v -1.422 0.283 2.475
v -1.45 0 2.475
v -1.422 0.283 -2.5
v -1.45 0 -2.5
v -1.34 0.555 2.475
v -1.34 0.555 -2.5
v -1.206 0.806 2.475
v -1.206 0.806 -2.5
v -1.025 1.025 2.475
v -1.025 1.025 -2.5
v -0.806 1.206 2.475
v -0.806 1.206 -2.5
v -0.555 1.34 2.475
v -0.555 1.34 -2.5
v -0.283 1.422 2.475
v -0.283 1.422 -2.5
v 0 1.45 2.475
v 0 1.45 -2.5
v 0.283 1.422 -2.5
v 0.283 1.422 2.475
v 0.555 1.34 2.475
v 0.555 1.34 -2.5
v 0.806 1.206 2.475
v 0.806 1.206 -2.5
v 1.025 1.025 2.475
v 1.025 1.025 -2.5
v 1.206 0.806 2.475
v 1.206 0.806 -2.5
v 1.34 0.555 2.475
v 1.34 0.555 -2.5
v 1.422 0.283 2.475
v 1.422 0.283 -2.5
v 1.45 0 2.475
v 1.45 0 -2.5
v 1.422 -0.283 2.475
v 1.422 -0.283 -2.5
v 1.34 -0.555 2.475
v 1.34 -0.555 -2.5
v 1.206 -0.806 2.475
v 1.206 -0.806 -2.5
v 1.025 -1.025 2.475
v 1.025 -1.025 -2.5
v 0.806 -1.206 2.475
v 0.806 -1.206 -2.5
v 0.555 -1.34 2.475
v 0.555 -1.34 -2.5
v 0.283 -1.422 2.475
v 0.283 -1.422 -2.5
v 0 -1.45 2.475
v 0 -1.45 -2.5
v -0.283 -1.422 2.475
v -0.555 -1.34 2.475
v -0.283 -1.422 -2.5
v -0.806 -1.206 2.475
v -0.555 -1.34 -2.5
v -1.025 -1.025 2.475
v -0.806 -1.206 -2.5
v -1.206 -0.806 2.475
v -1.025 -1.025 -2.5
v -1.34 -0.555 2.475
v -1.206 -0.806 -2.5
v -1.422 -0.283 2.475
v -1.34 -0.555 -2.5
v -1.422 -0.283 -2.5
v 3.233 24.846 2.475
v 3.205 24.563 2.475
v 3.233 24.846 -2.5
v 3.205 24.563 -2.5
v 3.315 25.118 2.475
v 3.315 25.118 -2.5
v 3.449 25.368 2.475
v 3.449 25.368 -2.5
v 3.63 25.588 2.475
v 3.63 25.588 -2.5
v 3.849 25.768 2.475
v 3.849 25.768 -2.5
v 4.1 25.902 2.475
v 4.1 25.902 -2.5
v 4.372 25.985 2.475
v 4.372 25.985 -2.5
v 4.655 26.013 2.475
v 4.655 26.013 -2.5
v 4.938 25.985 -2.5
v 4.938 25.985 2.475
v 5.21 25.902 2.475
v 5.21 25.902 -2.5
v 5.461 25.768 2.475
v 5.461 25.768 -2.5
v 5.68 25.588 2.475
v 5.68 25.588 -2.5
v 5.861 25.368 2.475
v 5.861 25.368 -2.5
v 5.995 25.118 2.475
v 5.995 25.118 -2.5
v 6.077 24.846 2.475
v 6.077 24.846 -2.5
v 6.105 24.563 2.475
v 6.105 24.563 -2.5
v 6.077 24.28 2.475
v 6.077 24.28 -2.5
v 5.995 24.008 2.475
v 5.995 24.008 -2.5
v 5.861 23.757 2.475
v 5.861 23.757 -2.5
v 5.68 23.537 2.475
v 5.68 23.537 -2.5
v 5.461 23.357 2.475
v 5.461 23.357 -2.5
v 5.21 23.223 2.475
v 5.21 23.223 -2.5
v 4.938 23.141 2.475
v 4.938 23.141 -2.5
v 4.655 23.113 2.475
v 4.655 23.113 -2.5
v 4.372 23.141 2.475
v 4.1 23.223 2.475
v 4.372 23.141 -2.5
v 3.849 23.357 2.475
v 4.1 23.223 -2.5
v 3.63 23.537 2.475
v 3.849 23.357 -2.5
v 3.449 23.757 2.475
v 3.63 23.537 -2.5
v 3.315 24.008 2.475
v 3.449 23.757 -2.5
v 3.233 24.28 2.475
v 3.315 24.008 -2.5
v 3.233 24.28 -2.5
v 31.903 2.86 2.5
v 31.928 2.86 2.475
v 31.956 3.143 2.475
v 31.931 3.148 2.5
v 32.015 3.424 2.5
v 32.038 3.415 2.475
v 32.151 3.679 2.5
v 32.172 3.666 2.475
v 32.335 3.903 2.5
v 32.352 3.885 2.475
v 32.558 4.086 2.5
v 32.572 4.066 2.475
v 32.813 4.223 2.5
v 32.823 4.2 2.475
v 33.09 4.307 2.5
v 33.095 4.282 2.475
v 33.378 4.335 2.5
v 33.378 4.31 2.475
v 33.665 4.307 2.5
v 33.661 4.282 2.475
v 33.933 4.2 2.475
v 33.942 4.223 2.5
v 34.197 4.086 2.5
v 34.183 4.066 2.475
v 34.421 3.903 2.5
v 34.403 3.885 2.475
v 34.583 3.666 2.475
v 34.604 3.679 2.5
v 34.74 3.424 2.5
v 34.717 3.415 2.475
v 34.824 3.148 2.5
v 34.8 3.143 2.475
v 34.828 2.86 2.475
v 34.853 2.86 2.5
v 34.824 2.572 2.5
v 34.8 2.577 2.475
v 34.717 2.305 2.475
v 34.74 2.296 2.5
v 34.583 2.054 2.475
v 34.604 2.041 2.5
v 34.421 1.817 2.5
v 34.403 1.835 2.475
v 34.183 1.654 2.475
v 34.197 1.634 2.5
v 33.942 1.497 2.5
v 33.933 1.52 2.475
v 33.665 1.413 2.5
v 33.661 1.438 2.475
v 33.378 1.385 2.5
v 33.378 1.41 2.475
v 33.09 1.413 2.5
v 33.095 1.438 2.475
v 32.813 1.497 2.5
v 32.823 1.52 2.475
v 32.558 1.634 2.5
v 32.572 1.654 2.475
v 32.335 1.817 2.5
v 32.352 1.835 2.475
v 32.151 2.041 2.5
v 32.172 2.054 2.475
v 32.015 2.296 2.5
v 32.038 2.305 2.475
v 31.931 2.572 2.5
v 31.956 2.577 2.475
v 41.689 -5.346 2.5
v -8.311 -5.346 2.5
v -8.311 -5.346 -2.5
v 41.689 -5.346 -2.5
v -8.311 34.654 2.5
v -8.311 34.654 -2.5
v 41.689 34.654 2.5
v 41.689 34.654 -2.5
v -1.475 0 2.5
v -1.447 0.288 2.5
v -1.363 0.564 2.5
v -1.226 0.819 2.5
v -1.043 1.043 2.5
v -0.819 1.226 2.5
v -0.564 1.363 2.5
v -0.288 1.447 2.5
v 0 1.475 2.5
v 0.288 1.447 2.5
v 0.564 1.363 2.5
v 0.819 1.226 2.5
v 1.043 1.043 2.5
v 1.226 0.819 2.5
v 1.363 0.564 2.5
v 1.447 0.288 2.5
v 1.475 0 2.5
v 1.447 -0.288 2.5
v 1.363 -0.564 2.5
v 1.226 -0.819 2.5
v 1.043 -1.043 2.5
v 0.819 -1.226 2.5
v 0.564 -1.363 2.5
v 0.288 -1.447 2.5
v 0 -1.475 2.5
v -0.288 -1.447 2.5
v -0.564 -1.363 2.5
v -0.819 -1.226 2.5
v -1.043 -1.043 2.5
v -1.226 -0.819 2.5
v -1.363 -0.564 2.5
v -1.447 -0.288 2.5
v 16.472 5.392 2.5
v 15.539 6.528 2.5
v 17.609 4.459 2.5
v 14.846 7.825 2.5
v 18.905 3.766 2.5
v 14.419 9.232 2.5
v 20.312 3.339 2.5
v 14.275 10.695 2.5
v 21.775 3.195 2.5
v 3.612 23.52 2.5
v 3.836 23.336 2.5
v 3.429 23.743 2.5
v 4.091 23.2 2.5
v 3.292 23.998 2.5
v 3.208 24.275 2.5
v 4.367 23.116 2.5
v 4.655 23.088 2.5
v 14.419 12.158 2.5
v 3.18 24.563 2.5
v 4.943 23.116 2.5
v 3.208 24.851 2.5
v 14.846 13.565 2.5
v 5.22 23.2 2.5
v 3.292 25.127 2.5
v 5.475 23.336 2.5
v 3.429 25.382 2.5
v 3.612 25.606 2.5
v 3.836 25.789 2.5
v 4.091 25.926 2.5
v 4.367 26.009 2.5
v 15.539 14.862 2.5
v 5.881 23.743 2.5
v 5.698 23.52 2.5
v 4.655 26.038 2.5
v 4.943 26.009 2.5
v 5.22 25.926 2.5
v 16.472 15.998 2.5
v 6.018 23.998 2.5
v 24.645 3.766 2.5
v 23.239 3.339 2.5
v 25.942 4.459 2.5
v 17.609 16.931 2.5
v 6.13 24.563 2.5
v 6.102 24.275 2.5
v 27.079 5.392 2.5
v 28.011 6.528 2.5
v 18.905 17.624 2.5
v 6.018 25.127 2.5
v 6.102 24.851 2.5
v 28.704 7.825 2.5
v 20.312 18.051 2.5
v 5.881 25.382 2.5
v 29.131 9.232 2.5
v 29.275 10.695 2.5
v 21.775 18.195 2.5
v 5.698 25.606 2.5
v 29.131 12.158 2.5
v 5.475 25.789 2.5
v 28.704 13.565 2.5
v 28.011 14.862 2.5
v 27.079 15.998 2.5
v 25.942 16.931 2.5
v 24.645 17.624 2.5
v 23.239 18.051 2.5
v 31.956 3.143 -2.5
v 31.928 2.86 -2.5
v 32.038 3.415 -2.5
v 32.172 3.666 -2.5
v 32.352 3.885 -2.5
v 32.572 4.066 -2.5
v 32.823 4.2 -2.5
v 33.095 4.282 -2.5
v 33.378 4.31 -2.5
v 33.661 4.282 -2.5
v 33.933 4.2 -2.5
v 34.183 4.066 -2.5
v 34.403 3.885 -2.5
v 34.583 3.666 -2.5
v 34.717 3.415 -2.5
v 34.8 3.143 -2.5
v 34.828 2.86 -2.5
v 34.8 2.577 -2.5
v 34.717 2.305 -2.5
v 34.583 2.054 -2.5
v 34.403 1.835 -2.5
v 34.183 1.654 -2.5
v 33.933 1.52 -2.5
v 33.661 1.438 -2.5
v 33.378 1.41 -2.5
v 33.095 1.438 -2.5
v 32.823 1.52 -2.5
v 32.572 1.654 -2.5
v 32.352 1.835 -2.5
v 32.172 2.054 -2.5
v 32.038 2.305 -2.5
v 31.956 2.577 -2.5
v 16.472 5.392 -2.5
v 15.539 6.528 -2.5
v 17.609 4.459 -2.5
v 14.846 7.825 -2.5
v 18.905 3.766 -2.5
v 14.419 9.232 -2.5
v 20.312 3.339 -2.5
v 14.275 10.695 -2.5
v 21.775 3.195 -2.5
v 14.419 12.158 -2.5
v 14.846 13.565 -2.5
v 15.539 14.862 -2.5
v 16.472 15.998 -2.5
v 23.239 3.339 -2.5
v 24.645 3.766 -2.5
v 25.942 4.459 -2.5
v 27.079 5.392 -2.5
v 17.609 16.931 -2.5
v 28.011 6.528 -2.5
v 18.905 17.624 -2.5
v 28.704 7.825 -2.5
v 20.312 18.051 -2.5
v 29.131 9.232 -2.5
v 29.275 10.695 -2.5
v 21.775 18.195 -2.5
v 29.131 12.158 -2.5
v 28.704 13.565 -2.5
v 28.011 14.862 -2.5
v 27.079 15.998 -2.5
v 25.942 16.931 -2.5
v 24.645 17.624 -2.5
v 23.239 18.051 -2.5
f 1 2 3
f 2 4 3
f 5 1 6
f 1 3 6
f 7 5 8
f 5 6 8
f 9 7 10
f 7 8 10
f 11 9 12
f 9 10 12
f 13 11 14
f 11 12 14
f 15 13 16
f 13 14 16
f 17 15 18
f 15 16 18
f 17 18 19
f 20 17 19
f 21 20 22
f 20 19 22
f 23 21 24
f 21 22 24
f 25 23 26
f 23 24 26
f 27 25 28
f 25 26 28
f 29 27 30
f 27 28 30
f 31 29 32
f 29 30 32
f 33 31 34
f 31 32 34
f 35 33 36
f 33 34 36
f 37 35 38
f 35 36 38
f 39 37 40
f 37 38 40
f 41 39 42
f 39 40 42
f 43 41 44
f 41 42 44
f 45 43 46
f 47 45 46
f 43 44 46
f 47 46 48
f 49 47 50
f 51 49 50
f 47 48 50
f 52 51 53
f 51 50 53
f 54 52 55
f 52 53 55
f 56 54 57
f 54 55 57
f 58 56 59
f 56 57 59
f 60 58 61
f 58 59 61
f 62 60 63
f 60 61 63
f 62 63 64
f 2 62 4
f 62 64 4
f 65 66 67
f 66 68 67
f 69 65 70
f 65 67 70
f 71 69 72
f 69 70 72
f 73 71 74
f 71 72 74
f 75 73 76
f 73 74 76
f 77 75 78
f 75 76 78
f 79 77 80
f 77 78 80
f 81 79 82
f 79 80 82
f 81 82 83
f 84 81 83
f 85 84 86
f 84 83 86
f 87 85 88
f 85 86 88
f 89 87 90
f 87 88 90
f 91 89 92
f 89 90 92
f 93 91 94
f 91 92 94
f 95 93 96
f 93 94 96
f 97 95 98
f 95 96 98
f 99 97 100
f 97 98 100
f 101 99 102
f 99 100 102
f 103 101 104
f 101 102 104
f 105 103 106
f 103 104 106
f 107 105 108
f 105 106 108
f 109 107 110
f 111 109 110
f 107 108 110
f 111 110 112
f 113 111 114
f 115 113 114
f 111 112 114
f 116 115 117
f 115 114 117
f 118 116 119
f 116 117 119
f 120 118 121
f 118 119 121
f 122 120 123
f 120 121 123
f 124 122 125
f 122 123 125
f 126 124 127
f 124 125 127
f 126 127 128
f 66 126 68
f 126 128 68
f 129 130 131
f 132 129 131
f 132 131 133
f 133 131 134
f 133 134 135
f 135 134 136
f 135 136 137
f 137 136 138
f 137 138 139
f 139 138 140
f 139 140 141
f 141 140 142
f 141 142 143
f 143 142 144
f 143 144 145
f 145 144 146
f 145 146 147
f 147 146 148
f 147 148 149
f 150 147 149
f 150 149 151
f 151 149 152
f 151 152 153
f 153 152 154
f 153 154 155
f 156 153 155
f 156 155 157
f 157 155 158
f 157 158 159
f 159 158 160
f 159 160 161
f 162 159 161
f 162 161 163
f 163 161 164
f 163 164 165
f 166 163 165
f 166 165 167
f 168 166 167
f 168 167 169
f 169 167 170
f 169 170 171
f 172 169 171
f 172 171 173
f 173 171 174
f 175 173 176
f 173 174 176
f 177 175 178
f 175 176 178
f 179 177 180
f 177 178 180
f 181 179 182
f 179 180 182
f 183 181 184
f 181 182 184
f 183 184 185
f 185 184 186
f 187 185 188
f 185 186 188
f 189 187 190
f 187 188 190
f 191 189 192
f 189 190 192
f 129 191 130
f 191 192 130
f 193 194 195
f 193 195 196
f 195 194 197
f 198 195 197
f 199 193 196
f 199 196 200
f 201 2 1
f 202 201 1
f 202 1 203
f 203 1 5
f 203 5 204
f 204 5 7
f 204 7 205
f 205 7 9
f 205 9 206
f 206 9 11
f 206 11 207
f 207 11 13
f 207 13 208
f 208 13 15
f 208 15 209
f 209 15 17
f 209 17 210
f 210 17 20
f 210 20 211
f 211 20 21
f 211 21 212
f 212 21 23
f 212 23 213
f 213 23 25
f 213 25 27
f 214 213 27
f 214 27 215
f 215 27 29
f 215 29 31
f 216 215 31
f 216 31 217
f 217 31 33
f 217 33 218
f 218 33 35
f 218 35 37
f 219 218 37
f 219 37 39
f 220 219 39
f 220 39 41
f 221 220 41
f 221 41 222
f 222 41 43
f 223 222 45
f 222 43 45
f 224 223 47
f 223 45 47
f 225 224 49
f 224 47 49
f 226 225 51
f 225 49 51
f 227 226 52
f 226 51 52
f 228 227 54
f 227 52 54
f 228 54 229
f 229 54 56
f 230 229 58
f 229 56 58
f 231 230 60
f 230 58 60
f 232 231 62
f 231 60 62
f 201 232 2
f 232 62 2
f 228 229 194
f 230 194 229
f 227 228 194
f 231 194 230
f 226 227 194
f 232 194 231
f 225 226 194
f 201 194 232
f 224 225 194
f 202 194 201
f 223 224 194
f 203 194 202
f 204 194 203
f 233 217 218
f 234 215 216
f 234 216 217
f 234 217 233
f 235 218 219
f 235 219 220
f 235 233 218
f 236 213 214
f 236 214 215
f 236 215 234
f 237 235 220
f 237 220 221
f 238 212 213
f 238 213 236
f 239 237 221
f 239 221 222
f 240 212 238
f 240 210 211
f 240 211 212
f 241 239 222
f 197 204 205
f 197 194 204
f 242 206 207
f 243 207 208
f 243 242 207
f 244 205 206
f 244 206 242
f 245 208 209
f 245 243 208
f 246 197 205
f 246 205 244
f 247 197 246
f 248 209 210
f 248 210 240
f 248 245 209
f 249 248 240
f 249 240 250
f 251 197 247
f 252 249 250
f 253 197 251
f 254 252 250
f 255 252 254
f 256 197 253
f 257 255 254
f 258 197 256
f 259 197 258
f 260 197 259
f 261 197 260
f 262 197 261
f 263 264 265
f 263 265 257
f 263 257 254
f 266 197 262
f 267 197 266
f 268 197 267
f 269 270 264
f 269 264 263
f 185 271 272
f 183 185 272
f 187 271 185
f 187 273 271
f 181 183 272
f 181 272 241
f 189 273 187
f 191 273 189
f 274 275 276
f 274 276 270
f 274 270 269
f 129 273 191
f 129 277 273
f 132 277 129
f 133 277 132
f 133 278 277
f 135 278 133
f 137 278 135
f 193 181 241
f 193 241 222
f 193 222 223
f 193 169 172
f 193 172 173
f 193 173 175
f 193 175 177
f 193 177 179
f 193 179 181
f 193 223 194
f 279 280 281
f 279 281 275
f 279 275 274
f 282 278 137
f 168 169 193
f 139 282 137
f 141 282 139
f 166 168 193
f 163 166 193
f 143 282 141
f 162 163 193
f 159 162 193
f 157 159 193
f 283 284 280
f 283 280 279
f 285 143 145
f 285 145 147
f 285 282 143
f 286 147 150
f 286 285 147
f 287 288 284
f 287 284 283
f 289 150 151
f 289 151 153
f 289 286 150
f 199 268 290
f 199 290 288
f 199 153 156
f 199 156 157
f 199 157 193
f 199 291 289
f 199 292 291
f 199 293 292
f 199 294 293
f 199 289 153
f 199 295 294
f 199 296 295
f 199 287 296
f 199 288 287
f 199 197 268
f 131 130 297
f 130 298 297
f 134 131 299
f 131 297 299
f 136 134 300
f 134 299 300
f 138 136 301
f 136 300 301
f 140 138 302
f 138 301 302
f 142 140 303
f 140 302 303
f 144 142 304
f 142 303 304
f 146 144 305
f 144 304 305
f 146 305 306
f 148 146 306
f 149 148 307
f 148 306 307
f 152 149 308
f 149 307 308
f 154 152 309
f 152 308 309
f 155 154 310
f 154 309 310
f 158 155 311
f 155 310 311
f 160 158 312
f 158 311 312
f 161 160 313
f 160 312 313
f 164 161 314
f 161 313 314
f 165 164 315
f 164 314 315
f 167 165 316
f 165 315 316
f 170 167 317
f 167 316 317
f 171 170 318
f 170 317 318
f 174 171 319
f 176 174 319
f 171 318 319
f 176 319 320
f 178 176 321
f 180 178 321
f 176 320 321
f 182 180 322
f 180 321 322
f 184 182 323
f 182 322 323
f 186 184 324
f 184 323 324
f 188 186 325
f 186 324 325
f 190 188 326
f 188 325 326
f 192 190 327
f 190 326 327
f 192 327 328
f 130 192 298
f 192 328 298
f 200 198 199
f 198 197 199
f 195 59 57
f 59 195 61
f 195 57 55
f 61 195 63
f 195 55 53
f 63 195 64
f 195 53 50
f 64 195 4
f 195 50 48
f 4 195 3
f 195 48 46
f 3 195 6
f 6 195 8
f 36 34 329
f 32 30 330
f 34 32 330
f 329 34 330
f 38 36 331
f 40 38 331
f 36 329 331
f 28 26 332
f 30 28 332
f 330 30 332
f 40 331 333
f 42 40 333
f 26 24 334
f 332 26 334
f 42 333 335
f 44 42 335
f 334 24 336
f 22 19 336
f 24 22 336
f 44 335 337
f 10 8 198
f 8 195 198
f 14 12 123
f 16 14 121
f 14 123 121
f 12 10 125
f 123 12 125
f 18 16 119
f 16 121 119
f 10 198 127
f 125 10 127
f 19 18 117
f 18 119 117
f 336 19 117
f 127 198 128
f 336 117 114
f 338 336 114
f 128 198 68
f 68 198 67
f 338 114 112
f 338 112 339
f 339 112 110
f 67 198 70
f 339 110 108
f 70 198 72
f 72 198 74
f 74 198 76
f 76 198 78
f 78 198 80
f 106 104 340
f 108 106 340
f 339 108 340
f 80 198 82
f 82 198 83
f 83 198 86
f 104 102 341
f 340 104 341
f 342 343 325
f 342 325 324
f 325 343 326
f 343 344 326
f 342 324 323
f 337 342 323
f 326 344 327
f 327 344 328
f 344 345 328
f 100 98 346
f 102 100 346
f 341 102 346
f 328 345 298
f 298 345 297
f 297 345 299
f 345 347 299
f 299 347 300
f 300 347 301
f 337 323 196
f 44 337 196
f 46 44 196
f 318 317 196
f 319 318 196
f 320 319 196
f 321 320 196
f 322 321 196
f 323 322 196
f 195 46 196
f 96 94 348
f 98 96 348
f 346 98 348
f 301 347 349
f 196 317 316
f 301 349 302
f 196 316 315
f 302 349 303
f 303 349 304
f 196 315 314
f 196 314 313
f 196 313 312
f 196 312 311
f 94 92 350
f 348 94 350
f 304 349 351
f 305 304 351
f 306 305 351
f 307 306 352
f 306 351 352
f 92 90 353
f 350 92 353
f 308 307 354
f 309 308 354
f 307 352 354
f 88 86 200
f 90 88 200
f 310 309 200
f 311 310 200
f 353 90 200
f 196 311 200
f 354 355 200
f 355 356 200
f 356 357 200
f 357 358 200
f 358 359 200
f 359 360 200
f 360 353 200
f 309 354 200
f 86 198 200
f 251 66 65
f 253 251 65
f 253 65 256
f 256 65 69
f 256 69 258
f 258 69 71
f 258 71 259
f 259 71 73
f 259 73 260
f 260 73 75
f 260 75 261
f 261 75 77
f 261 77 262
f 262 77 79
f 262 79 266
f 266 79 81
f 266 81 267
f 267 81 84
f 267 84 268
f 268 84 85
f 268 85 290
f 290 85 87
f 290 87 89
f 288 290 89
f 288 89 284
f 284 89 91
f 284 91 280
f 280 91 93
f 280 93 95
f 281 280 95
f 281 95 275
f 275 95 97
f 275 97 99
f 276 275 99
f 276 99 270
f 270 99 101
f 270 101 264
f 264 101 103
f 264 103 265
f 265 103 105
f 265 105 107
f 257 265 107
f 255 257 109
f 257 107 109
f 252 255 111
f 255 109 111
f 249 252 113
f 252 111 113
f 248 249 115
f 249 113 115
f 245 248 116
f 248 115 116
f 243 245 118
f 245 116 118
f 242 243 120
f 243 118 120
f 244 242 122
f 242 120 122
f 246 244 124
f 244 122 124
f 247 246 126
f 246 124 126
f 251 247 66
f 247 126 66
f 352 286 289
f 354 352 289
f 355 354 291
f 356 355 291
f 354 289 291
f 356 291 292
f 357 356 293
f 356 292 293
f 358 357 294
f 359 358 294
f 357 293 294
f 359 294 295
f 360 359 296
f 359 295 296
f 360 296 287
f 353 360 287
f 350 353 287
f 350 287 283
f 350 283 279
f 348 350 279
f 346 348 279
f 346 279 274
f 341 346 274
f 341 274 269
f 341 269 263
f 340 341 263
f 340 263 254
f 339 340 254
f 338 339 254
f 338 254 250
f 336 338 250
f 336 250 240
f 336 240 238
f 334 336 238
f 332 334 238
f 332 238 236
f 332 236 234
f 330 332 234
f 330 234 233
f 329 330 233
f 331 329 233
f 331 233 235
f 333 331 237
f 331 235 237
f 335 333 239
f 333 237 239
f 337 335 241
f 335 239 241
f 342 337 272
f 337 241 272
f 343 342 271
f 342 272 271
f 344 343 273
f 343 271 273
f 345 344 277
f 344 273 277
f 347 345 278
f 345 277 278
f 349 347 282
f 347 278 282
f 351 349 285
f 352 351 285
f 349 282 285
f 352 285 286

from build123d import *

# Parameters (mm, degrees)
SKETCH1_W                        = 50
SKETCH1_H                        = 40
BOSS_EXTRUDE1_DEPTH              = 2.5
M2_5_CLEARANCE_HOLE2_D           = 2.9
M2_5_CLEARANCE_HOLE2_CSINK_D     = 2.95
M2_5_CLEARANCE_HOLE2_CSINK_ANGLE = 90
SKETCH4_R                        = 7.5
CUT_EXTRUDE1_DEPTH               = 6


with BuildPart() as part:
    # Sketch1 → Boss-Extrude1 (new body, symmetric)
    with BuildSketch(Plane.XY):
        with Locations((16.688846575, 14.654391813)):
            Rectangle(SKETCH1_W, SKETCH1_H)
    extrude(amount=BOSS_EXTRUDE1_DEPTH, both=True)

    # M2.5 Clearance Hole2 (through all)
    with Locations(Plane.XY.offset(2.5)):
        with Locations((4.655068225, 24.562783633), (33.37769315, 2.86), (0, 0)):
            CounterSinkHole(M2_5_CLEARANCE_HOLE2_D / 2, M2_5_CLEARANCE_HOLE2_CSINK_D / 2, counter_sink_angle=M2_5_CLEARANCE_HOLE2_CSINK_ANGLE)

    # Sketch4 → Cut-Extrude1 (cut, through all)
    with BuildSketch(Plane.XY.offset(2.5)):
        with Locations((21.775361697, 10.694915753)):
            Circle(SKETCH4_R)
    extrude(amount=-CUT_EXTRUDE1_DEPTH, mode=Mode.SUBTRACT)


solid = part.part
